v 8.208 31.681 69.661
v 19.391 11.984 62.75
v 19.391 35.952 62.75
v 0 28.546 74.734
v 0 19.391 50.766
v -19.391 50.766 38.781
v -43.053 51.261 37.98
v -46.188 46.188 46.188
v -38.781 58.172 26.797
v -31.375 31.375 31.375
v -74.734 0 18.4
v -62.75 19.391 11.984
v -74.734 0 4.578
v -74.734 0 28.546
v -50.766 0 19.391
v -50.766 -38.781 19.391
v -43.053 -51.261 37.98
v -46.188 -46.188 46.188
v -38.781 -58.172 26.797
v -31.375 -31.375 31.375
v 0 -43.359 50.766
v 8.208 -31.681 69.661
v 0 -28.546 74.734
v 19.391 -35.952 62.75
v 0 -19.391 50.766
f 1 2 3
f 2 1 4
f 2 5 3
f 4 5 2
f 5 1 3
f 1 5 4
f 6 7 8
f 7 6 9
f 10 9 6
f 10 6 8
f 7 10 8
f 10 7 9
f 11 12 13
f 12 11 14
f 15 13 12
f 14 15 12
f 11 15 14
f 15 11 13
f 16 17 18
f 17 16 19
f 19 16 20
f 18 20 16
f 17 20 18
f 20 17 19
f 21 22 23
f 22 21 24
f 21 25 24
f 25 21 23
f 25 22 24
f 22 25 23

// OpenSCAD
// file: def.scad
inf = 1000;

round_radius = 1;
sticker_margin = 2.5;
sticker_round_radius = 0.75;

phi = (sqrt(5) + 1) / 2;
outer_radius = 80;
edge_length = outer_radius / sqrt(phi * phi * phi * phi + 1) * 2;
inner_radius = sqrt(outer_radius * outer_radius - (edge_length / 2 / cos(54)) * (edge_length / 2 / cos(54)));
cut1_length = edge_length / (1 / (phi * phi) + 2) * 3;
center_cut_length = edge_length * (sin(54) + 1);
cut1_dis = inner_radius * (center_cut_length - cut1_length) / (center_cut_length - edge_length);

theta = atan(edge_length / 2 * tan(54) / inner_radius);

face_inner_radius = edge_length / 2 * tan(54);
face_center_length = edge_length * tan(54) / cos(18);
sticker_cut1_dis = face_inner_radius * (face_center_length - cut1_length) / (face_center_length - edge_length);
sticker_dif_cut1_dis = sticker_cut1_dis - round_radius * tan(theta) + round_radius - sticker_margin;
sticker_int_cut1_dis = sticker_cut1_dis + round_radius / tan(theta) - round_radius + sticker_margin;
sticker_dif_cut2_dis = face_inner_radius - round_radius * tan(theta) + round_radius - sticker_margin;

module _int_cut1() {
    translate([-inf, -inf, cut1_dis + round_radius])
        cube([inf * 2, inf * 2, inf]);
}

module _dif_cut1() {
    translate([-inf, -inf, cut1_dis - round_radius])
        cube([inf * 2, inf * 2, inf]);
}

module _sticker_int_cut1() {
    rotate([-90, 0, 0])
        translate([-inf, -inf, sticker_int_cut1_dis])
            cube([inf * 2, inf * 2, inf]);
}

module _sticker_dif_cut1() {
    rotate([-90, 0, 0])
        translate([-inf, -inf, sticker_dif_cut1_dis])
            cube([inf * 2, inf * 2, inf]);
}

module _sticker_dif_cut2() {
    rotate([-90, 0, 0])
        translate([-inf, -inf, sticker_dif_cut2_dis])
            cube([inf * 2, inf * 2, inf]);
}

module _base() {
    intersection_for(vec = [[0, 0, 0], [90, 90, 0], [90, 0, 90]])
        intersection_for(ang = [theta, -theta, 180 + theta, 180 - theta])
            rotate(vec)
                rotate([0, ang, 0])
                    translate([-inf, -inf, -inner_radius + round_radius])
                        cube([inf * 2, inf * 2, inf]);
}

module _sticker_base() {
    difference() {
        cube([inf, inf, 0.1], center = true);
        for (ang = [0 : 72 : 288])
            rotate([0, 0, ang])
                _sticker_dif_cut2();
    }
}

module _selector_base(dis) {
    intersection_for(vec = [[0, 0, 0], [90, 90, 0], [90, 0, 90]])
        intersection_for(ang = [theta, -theta, 180 + theta, 180 - theta])
            rotate(vec)
                rotate([0, ang, 0])
                    translate([-inf, -inf, -dis])
                        cube([inf * 2, inf * 2, inf]);
}
// main file
include <def.scad>

module selector_ccw() {
    difference() {
        intersection() {
            _selector_base(inner_radius);
            rotate([0, -theta, 0])
                translate([-inf, -inf, cut1_dis])
                    cube([inf * 2, inf * 2, inf]);
        }
        rotate([0, theta, 0])
            rotate([90, 0, -36])
                translate([-inf, -inf, 0])
                    cube([inf * 2, inf * 2, inf]);
        rotate([0, -theta, 0])
            rotate([-90, 0, 36])
                translate([-inf, -inf, 0])
                    cube([inf * 2, inf * 2, inf]);
    }
}

for (ang = [0 : 72 : 288])
    rotate([0, -theta, 0])
        rotate([0, theta, ang])
            selector_ccw();
